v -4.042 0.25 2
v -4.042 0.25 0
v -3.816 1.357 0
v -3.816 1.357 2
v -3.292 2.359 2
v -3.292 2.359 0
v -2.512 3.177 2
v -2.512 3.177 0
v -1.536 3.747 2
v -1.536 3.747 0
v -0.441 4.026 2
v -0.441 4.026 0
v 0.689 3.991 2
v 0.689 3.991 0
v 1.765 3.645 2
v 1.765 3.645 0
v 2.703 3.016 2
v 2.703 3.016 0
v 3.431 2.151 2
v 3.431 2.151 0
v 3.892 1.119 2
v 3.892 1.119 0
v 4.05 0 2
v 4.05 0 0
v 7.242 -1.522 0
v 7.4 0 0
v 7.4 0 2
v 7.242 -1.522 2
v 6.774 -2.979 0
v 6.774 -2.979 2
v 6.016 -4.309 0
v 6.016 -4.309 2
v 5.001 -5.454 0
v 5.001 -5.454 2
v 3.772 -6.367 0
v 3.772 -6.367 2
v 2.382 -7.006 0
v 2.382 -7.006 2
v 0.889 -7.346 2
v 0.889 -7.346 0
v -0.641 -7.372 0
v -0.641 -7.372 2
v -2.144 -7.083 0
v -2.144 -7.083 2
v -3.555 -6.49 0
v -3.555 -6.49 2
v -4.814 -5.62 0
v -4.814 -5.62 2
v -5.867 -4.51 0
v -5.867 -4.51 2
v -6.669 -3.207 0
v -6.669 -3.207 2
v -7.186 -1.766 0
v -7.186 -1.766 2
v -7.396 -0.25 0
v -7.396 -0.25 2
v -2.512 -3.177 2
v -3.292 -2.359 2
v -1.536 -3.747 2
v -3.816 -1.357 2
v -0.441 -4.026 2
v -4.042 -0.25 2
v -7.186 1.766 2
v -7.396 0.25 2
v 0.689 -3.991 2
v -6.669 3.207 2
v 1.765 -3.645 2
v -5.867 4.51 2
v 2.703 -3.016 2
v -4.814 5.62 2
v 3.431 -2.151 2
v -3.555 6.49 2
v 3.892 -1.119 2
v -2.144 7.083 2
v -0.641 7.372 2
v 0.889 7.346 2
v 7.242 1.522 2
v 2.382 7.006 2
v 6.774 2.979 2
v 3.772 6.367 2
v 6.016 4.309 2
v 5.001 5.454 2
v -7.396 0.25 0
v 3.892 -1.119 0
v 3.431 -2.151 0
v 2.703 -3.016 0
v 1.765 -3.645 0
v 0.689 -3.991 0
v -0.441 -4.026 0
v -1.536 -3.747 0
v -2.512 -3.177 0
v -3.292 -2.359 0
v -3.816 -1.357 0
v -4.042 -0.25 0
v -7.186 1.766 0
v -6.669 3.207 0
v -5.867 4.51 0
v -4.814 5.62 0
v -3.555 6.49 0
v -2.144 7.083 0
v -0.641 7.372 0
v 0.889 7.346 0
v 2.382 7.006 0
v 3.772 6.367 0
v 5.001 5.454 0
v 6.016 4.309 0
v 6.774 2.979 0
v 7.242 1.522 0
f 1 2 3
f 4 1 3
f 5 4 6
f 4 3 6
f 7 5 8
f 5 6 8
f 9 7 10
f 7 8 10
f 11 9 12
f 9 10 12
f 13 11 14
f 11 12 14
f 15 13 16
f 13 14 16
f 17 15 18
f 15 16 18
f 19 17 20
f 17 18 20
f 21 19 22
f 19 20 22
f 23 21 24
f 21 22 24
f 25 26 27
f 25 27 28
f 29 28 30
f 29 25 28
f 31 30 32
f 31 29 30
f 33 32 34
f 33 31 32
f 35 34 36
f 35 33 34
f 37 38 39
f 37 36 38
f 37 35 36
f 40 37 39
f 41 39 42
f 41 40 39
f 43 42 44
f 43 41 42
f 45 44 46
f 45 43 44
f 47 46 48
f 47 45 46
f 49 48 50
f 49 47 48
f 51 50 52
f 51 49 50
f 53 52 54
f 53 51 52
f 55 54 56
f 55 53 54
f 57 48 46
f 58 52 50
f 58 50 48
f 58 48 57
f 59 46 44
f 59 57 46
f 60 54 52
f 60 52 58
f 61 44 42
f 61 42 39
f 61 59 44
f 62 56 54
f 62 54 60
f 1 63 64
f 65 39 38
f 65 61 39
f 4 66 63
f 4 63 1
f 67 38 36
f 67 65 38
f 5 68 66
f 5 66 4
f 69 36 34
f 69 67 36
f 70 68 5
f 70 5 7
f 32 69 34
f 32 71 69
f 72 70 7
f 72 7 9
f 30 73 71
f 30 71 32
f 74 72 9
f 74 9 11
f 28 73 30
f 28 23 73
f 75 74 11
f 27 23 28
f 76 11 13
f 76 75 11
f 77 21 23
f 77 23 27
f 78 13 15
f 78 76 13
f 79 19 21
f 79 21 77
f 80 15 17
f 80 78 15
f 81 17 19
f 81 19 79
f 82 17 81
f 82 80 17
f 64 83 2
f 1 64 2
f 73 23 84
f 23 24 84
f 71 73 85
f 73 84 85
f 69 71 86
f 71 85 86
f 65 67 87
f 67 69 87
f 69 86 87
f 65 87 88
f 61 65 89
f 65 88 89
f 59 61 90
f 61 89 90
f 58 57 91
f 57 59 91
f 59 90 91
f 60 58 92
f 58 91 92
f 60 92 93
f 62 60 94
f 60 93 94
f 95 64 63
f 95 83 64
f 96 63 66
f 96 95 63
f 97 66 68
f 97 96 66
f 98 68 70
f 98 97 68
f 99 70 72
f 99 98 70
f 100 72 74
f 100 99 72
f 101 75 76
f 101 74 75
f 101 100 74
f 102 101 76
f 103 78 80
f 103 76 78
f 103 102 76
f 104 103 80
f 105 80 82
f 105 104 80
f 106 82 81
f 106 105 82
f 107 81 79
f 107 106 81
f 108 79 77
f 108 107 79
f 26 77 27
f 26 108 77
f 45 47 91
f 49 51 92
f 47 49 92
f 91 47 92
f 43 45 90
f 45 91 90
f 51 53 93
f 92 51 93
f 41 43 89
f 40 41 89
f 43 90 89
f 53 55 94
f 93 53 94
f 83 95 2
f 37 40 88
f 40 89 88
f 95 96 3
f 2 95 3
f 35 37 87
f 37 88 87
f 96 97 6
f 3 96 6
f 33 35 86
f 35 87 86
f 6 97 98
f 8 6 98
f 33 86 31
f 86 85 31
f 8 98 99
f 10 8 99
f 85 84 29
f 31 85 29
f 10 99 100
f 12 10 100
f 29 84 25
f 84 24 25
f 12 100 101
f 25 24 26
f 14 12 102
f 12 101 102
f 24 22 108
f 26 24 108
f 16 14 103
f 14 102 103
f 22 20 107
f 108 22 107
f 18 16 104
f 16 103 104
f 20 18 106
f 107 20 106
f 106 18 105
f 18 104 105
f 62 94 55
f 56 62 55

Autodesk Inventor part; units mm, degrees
ref_plane "YZ Plane" through (0, 0, 0) normal (1, 0, 0) x (0, 1, 0)
ref_plane "XZ Plane" through (0, 0, 0) normal (0, 1, 0) x (-1, 0, 0)
ref_plane "XY Plane" through (0, 0, 0) normal (0, 0, 1) x (1, 0, 0)
sketch "Sketch1" plane through (0, 0, 0) normal (0, 0, 1) x (1, 0, 0)
  circle A0 centre (0, 0) radius 4.05
  circle A1 centre (0, 0) radius 7.4
  line L0 (-8.7062, 0.25) -> (-2.7169, 0.25)
  line L1 (-2.7169, -0.25) -> (-8.7062, -0.25)
  line L2 (-8.7062, 0.25) -> (-8.7062, -0.25)
  line L3 (-2.7169, 0.25) -> (-2.7169, -0.25)
  point P0 (-4.0423, -0.25)
  point P1 (-7.3958, -0.25)
  point P2 (-7.3958, 0.25)
  point P3 (-4.0423, 0.25)
  dimension "d0" = 8.1
  dimension "d1" = 14.8
  dimension "d2" = 0.25
  dimension "d3" = 0.5
extrude "Extrusion1" add sketch "Sketch1" along normal blind 2 contours A0 L0 A1 L1 picked at (6.1755, 0.9009)
properties part number "Arandela Grower M8"
